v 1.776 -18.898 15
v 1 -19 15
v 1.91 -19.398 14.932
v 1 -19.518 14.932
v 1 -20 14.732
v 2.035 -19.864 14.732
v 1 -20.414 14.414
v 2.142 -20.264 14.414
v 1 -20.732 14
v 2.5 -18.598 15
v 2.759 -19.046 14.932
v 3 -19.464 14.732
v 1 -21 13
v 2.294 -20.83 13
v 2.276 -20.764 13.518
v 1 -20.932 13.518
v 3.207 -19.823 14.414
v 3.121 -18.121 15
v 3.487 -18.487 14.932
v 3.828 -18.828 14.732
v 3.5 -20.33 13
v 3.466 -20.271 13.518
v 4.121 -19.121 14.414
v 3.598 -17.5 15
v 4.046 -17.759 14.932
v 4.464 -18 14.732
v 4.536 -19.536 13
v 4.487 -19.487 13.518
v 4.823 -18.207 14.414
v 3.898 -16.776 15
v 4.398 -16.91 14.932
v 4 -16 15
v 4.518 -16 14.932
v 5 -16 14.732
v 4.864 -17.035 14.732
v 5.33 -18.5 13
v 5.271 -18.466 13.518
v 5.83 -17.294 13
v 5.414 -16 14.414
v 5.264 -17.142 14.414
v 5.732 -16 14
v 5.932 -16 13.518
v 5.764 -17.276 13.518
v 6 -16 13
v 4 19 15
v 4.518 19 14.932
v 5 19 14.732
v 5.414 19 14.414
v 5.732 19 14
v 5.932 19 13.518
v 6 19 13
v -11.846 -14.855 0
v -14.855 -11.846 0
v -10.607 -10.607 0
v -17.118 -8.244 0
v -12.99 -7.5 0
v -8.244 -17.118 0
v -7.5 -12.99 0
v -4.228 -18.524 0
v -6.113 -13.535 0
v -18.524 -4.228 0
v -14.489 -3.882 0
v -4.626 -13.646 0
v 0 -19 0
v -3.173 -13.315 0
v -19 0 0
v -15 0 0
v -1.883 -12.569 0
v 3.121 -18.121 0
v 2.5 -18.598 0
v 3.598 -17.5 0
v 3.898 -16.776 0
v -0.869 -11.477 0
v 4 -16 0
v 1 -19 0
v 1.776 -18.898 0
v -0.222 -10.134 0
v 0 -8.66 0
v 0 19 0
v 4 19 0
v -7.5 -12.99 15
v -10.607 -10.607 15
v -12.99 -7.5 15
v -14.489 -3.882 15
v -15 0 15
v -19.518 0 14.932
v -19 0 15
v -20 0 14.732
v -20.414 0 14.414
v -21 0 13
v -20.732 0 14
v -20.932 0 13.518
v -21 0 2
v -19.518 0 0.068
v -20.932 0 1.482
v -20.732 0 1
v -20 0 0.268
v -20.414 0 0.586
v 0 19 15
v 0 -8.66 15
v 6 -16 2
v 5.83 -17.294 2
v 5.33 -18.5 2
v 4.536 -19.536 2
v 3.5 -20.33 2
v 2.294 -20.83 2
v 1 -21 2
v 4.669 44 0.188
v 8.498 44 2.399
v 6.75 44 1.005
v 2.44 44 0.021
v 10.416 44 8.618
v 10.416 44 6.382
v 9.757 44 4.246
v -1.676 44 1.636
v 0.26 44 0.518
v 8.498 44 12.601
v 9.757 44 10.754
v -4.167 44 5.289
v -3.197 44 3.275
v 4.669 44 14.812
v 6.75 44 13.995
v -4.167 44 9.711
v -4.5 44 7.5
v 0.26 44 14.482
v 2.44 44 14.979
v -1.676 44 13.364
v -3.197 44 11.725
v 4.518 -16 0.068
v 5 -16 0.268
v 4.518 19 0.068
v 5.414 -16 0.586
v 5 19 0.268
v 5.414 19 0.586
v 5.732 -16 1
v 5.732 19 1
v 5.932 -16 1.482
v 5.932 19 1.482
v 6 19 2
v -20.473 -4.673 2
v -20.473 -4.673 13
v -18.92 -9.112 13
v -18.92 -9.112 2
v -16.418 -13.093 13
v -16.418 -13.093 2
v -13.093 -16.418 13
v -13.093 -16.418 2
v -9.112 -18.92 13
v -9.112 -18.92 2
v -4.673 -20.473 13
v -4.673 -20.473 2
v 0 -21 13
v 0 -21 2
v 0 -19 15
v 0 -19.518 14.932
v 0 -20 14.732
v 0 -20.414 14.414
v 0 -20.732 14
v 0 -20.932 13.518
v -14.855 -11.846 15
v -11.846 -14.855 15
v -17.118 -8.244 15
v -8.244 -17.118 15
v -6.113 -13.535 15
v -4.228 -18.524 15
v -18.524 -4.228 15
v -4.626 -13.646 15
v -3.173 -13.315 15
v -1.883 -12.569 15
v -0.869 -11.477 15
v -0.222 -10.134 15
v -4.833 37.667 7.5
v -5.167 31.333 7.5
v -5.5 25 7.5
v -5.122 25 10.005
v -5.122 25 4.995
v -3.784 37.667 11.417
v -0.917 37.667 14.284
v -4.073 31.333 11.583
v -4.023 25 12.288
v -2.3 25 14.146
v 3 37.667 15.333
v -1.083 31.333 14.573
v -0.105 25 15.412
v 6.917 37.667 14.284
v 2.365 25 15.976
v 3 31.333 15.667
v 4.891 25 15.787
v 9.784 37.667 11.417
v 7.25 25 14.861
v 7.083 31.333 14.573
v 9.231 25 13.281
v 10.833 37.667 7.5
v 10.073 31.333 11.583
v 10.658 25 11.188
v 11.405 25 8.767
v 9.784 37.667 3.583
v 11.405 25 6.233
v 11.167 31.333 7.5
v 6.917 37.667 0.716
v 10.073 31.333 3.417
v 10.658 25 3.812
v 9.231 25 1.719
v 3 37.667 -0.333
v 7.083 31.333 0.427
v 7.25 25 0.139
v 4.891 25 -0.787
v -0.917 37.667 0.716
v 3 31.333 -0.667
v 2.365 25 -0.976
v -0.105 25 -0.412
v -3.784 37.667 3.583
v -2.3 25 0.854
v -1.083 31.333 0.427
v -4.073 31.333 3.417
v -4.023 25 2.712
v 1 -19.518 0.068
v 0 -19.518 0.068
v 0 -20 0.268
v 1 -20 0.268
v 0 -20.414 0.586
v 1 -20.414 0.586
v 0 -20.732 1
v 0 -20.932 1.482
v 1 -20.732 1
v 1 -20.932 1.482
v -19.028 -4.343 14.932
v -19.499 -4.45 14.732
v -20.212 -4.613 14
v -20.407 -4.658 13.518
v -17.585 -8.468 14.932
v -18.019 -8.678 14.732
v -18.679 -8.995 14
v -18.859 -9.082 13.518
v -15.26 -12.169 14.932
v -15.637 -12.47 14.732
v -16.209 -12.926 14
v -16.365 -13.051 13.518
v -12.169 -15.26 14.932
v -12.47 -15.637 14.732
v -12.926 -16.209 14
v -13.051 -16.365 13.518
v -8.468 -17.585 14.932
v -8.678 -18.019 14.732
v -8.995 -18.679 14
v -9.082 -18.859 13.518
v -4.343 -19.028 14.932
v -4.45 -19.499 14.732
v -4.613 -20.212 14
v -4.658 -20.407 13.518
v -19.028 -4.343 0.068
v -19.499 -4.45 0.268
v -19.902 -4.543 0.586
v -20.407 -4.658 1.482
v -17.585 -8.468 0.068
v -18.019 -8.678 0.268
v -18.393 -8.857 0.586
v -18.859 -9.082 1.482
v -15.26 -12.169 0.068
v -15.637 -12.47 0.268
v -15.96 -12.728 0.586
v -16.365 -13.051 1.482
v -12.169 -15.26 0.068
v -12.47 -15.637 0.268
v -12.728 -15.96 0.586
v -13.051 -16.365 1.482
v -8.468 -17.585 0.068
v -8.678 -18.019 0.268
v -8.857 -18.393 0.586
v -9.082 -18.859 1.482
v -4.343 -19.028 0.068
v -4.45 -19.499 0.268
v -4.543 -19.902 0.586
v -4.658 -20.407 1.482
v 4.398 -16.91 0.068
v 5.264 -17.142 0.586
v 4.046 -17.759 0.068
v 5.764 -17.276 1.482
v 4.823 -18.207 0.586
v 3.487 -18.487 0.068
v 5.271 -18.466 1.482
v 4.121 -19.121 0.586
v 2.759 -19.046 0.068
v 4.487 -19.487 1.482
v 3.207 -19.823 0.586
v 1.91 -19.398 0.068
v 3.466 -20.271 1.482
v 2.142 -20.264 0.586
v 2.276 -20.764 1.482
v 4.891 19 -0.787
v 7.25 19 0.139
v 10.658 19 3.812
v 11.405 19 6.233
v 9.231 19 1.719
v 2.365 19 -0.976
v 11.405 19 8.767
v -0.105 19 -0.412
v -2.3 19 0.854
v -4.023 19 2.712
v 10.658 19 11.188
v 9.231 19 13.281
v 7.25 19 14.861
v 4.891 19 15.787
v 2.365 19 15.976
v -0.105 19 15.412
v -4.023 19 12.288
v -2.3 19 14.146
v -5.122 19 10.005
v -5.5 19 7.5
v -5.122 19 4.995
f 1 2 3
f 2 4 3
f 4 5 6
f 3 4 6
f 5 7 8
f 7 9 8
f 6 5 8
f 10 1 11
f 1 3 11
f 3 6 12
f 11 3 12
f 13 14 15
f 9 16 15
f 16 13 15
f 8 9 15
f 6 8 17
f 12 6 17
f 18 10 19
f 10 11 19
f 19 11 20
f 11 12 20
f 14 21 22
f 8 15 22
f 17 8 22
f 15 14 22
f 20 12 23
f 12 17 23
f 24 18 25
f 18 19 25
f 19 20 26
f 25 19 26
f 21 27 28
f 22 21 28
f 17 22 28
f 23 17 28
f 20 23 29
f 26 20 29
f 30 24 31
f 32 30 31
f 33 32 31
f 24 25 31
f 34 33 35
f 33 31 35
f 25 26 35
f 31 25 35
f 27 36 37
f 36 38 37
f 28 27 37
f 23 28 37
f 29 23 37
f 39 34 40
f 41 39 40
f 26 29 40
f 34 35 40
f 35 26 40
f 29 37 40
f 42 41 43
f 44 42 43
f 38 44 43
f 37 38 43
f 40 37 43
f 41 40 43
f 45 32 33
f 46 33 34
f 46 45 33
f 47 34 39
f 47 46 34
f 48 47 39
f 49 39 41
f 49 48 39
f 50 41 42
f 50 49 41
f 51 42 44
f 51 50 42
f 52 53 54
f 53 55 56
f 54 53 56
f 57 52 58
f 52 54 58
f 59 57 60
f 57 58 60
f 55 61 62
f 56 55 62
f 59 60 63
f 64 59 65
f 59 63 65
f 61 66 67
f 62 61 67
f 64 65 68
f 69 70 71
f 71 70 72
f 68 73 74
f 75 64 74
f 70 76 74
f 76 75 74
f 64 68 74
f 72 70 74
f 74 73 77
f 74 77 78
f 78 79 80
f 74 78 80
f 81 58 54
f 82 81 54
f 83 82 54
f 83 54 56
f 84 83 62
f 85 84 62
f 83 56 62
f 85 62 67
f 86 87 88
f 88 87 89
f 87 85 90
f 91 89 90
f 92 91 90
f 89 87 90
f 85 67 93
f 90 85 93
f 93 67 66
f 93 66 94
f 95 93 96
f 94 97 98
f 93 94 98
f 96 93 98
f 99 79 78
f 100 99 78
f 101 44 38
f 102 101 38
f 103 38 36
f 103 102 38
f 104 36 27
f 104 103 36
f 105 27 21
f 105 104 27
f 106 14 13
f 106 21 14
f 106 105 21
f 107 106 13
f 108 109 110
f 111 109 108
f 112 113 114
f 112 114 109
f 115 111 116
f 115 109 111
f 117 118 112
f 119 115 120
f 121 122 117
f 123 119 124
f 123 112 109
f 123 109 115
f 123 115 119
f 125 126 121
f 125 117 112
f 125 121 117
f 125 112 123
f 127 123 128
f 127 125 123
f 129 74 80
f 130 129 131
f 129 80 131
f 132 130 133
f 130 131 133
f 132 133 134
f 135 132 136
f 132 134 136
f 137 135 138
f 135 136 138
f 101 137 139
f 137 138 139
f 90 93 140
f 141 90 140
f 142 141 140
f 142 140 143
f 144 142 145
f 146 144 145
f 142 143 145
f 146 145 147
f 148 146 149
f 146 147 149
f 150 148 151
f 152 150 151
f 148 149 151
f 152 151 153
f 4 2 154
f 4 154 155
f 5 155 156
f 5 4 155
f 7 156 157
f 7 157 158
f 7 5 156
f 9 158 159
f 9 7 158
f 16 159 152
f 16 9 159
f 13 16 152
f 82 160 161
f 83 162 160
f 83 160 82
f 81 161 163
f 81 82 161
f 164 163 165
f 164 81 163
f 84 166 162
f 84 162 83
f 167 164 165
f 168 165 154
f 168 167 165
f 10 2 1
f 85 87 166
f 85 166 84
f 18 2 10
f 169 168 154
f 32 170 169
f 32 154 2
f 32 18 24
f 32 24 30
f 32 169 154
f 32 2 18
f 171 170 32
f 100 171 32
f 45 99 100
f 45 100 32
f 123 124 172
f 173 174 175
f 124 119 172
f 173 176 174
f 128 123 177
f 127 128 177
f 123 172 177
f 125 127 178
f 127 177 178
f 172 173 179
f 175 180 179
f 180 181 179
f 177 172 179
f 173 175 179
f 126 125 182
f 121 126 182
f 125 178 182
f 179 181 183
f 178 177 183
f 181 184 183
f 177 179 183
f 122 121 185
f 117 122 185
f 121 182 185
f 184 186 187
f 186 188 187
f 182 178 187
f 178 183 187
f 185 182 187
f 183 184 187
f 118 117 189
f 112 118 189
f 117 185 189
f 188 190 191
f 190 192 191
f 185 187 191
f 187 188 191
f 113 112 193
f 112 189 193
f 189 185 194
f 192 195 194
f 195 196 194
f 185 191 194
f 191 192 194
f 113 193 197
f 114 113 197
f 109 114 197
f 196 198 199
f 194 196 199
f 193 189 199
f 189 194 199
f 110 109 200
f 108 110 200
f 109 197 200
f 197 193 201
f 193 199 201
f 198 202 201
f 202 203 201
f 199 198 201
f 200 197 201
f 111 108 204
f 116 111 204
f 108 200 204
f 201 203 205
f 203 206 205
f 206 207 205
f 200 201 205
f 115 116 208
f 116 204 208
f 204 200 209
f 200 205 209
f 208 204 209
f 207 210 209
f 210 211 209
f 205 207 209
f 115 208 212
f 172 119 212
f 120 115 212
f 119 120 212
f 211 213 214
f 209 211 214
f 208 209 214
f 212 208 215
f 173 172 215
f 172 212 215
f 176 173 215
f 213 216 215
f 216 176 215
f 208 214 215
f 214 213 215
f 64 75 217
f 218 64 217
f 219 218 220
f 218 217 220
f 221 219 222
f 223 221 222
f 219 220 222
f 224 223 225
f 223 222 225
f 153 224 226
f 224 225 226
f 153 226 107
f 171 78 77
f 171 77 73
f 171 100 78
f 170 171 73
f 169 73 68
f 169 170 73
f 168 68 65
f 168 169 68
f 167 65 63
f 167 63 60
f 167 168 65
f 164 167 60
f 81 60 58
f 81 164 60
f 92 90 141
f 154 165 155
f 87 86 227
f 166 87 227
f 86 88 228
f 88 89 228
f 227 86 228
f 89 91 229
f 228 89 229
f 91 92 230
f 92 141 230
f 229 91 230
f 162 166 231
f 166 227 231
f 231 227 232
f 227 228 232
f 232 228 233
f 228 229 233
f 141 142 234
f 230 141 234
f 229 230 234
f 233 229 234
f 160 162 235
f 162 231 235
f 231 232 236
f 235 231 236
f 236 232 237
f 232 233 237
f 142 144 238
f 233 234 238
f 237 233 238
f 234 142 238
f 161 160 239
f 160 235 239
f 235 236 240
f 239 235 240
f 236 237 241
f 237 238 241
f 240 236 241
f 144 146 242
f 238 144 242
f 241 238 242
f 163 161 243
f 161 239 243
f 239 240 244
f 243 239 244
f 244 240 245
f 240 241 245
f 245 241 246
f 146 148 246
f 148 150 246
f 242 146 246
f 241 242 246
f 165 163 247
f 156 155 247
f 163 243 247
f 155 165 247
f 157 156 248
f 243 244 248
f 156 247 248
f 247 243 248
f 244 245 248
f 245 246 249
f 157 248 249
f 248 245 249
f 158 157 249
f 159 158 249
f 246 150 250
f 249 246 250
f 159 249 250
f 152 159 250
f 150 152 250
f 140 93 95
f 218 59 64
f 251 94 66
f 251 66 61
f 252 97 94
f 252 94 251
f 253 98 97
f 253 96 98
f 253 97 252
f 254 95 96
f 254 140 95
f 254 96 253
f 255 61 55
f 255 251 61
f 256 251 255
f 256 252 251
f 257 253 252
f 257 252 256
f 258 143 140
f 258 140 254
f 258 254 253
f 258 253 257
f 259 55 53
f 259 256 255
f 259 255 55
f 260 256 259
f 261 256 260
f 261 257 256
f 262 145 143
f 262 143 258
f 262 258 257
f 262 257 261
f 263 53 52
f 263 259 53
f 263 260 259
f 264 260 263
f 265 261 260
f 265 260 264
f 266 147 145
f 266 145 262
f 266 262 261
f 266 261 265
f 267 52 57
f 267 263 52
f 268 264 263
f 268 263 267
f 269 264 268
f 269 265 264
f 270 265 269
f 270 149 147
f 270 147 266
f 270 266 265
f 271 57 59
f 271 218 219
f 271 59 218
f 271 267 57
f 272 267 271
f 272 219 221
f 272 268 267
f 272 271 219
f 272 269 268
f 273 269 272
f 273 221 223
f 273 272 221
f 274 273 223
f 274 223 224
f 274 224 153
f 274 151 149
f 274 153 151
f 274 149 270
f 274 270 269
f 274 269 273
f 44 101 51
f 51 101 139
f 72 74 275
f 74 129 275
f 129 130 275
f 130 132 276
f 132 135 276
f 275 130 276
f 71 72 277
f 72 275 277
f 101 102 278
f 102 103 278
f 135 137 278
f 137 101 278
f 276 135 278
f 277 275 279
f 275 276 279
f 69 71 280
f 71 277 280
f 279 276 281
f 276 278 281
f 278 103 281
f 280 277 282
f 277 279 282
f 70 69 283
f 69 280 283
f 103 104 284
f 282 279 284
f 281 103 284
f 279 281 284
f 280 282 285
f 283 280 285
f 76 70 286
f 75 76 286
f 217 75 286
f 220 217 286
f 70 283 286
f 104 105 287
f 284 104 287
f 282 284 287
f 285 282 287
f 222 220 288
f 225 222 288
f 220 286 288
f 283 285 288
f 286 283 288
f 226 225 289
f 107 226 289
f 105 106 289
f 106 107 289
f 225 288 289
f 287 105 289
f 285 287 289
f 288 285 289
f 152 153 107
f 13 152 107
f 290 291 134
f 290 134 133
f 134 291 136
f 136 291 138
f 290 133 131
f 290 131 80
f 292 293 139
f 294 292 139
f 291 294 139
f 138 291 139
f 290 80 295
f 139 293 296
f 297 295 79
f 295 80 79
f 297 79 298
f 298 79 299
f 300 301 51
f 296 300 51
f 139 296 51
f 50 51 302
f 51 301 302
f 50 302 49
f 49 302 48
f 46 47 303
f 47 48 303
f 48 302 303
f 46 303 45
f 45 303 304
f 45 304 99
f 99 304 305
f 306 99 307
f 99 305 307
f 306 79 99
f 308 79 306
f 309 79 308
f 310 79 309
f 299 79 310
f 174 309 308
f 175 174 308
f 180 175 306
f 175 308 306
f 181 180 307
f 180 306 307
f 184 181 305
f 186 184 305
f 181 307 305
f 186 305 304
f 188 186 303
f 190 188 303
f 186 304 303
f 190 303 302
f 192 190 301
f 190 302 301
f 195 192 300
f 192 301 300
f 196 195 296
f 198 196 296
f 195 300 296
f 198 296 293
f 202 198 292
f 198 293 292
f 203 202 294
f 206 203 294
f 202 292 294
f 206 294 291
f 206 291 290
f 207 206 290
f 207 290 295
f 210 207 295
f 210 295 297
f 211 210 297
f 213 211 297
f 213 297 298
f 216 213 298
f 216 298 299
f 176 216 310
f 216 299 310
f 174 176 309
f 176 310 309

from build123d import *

# Parameters (mm, degrees)
F1_DEPTH    = 15
F2_R        = 8.5
F2_W        = 6
F2_H        = 15
F3_DEPTH    = 25
F4_SIZE2    = 19
F4_SIZE     = 1
F5_R        = 2
F6_R        = 5
F7_T1_DEPTH = 15
F7_T4_ANGLE = 90
F7_T6_ANGLE = 90


# Not quite as in the source:
# - a fillet or chamfer that OpenCascade refuses, or shapes differently, is made with other operations: its cross-section is extruded or revolved along the edge and cut away or added


with BuildPart() as f1:
    # F0 (on Top) → F1 (new body)
    with BuildSketch(Plane.XY):
        with BuildLine():
            ThreePointArc((-21, 0), (-14.8492424049, -14.8492424049), (0, -21))
            Line((0, -21), (0, -15))
            ThreePointArc((0, -15), (-10.6066017178, -10.6066017178), (-15, 0))
            Line((-15, 0), (-21, 0))
        make_face()
        Polygon((0, -15), (0, -21), (6, -21), (6, 19), (0, 19), (0, 0), align=None)
    extrude(amount=F1_DEPTH)

    # F2 (on face) → F3 (join)
    with BuildSketch(Plane(origin=(0, 19, 0), x_dir=(-1, 0, 0), z_dir=(0, 1, 0))):
        with Locations((-3, 7.5)):
            Circle(F2_R)
        with Locations((-3, 7.5)):
            Rectangle(F2_W, F2_H, mode=Mode.SUBTRACT)
        with Locations((-3, 7.5)):
            Rectangle(F2_W, F2_H)
    extrude(amount=F3_DEPTH)

    # F4
    f4_edges = [f1.edges().sort_by_distance(p)[0] for p in [
        (11.5, 44, 7.5),
    ]]
    f4_side = f1.faces().sort_by_distance((3, 44, 7.5))[0]
    chamfer(f4_edges, length=F4_SIZE, length2=F4_SIZE2, reference=f4_side)

    # F5
    f5_edges = [f1.edges().sort_by_distance(p)[0] for p in [
        (6, -1, 15),
        (-14.849242, -14.849242, 15),
        (3, -21, 0),
        (-14.849242, -14.849242, 0),
        (6, -1, 0),
    ]]
    fillet(f5_edges, radius=F5_R)

    # F6
    f6_edges = [f1.edges().sort_by_distance(p)[0] for p in [
        (0, -15, 7.5),
    ]]
    fillet(f6_edges, radius=F6_R)

    # F7: fillet of radius 5 on 1 edges, made by hand

    # F7_s2 → F7_t1 (cut)
    with BuildSketch(Plane.XY):
        with BuildLine():
            ThreePointArc((6, -16), (4.5355339059, -19.5355339059), (1, -21))
            Line((1, -21), (6, -21))
            Line((6, -21), (6, -16))
        make_face()
    extrude(amount=F7_T1_DEPTH, mode=Mode.SUBTRACT)

    # F7_s3 → F7_t4 (revolve, cut)
    with BuildSketch(Plane.XZ.offset(16)):
        with BuildLine():
            ThreePointArc((4, 0), (5.4142135624, 0.5857864376), (6, 2))
            Line((6, 2), (6, 0))
            Line((6, 0), (4, 0))
        make_face()
    revolve(axis=Axis((1, -16, 0), (0, 0, -1)), revolution_arc=F7_T4_ANGLE, mode=Mode.SUBTRACT)

    # F7_s5 → F7_t6 (revolve, cut)
    with BuildSketch(Plane.YZ.offset(1)):
        with BuildLine():
            ThreePointArc((-19, 15), (-20.4142135624, 14.4142135624), (-21, 13))
            Line((-21, 13), (-21, 15))
            Line((-21, 15), (-19, 15))
        make_face()
    revolve(axis=Axis((1, -16, 15), (0, 0, 1)), revolution_arc=F7_T6_ANGLE, mode=Mode.SUBTRACT)


solid = f1.part
